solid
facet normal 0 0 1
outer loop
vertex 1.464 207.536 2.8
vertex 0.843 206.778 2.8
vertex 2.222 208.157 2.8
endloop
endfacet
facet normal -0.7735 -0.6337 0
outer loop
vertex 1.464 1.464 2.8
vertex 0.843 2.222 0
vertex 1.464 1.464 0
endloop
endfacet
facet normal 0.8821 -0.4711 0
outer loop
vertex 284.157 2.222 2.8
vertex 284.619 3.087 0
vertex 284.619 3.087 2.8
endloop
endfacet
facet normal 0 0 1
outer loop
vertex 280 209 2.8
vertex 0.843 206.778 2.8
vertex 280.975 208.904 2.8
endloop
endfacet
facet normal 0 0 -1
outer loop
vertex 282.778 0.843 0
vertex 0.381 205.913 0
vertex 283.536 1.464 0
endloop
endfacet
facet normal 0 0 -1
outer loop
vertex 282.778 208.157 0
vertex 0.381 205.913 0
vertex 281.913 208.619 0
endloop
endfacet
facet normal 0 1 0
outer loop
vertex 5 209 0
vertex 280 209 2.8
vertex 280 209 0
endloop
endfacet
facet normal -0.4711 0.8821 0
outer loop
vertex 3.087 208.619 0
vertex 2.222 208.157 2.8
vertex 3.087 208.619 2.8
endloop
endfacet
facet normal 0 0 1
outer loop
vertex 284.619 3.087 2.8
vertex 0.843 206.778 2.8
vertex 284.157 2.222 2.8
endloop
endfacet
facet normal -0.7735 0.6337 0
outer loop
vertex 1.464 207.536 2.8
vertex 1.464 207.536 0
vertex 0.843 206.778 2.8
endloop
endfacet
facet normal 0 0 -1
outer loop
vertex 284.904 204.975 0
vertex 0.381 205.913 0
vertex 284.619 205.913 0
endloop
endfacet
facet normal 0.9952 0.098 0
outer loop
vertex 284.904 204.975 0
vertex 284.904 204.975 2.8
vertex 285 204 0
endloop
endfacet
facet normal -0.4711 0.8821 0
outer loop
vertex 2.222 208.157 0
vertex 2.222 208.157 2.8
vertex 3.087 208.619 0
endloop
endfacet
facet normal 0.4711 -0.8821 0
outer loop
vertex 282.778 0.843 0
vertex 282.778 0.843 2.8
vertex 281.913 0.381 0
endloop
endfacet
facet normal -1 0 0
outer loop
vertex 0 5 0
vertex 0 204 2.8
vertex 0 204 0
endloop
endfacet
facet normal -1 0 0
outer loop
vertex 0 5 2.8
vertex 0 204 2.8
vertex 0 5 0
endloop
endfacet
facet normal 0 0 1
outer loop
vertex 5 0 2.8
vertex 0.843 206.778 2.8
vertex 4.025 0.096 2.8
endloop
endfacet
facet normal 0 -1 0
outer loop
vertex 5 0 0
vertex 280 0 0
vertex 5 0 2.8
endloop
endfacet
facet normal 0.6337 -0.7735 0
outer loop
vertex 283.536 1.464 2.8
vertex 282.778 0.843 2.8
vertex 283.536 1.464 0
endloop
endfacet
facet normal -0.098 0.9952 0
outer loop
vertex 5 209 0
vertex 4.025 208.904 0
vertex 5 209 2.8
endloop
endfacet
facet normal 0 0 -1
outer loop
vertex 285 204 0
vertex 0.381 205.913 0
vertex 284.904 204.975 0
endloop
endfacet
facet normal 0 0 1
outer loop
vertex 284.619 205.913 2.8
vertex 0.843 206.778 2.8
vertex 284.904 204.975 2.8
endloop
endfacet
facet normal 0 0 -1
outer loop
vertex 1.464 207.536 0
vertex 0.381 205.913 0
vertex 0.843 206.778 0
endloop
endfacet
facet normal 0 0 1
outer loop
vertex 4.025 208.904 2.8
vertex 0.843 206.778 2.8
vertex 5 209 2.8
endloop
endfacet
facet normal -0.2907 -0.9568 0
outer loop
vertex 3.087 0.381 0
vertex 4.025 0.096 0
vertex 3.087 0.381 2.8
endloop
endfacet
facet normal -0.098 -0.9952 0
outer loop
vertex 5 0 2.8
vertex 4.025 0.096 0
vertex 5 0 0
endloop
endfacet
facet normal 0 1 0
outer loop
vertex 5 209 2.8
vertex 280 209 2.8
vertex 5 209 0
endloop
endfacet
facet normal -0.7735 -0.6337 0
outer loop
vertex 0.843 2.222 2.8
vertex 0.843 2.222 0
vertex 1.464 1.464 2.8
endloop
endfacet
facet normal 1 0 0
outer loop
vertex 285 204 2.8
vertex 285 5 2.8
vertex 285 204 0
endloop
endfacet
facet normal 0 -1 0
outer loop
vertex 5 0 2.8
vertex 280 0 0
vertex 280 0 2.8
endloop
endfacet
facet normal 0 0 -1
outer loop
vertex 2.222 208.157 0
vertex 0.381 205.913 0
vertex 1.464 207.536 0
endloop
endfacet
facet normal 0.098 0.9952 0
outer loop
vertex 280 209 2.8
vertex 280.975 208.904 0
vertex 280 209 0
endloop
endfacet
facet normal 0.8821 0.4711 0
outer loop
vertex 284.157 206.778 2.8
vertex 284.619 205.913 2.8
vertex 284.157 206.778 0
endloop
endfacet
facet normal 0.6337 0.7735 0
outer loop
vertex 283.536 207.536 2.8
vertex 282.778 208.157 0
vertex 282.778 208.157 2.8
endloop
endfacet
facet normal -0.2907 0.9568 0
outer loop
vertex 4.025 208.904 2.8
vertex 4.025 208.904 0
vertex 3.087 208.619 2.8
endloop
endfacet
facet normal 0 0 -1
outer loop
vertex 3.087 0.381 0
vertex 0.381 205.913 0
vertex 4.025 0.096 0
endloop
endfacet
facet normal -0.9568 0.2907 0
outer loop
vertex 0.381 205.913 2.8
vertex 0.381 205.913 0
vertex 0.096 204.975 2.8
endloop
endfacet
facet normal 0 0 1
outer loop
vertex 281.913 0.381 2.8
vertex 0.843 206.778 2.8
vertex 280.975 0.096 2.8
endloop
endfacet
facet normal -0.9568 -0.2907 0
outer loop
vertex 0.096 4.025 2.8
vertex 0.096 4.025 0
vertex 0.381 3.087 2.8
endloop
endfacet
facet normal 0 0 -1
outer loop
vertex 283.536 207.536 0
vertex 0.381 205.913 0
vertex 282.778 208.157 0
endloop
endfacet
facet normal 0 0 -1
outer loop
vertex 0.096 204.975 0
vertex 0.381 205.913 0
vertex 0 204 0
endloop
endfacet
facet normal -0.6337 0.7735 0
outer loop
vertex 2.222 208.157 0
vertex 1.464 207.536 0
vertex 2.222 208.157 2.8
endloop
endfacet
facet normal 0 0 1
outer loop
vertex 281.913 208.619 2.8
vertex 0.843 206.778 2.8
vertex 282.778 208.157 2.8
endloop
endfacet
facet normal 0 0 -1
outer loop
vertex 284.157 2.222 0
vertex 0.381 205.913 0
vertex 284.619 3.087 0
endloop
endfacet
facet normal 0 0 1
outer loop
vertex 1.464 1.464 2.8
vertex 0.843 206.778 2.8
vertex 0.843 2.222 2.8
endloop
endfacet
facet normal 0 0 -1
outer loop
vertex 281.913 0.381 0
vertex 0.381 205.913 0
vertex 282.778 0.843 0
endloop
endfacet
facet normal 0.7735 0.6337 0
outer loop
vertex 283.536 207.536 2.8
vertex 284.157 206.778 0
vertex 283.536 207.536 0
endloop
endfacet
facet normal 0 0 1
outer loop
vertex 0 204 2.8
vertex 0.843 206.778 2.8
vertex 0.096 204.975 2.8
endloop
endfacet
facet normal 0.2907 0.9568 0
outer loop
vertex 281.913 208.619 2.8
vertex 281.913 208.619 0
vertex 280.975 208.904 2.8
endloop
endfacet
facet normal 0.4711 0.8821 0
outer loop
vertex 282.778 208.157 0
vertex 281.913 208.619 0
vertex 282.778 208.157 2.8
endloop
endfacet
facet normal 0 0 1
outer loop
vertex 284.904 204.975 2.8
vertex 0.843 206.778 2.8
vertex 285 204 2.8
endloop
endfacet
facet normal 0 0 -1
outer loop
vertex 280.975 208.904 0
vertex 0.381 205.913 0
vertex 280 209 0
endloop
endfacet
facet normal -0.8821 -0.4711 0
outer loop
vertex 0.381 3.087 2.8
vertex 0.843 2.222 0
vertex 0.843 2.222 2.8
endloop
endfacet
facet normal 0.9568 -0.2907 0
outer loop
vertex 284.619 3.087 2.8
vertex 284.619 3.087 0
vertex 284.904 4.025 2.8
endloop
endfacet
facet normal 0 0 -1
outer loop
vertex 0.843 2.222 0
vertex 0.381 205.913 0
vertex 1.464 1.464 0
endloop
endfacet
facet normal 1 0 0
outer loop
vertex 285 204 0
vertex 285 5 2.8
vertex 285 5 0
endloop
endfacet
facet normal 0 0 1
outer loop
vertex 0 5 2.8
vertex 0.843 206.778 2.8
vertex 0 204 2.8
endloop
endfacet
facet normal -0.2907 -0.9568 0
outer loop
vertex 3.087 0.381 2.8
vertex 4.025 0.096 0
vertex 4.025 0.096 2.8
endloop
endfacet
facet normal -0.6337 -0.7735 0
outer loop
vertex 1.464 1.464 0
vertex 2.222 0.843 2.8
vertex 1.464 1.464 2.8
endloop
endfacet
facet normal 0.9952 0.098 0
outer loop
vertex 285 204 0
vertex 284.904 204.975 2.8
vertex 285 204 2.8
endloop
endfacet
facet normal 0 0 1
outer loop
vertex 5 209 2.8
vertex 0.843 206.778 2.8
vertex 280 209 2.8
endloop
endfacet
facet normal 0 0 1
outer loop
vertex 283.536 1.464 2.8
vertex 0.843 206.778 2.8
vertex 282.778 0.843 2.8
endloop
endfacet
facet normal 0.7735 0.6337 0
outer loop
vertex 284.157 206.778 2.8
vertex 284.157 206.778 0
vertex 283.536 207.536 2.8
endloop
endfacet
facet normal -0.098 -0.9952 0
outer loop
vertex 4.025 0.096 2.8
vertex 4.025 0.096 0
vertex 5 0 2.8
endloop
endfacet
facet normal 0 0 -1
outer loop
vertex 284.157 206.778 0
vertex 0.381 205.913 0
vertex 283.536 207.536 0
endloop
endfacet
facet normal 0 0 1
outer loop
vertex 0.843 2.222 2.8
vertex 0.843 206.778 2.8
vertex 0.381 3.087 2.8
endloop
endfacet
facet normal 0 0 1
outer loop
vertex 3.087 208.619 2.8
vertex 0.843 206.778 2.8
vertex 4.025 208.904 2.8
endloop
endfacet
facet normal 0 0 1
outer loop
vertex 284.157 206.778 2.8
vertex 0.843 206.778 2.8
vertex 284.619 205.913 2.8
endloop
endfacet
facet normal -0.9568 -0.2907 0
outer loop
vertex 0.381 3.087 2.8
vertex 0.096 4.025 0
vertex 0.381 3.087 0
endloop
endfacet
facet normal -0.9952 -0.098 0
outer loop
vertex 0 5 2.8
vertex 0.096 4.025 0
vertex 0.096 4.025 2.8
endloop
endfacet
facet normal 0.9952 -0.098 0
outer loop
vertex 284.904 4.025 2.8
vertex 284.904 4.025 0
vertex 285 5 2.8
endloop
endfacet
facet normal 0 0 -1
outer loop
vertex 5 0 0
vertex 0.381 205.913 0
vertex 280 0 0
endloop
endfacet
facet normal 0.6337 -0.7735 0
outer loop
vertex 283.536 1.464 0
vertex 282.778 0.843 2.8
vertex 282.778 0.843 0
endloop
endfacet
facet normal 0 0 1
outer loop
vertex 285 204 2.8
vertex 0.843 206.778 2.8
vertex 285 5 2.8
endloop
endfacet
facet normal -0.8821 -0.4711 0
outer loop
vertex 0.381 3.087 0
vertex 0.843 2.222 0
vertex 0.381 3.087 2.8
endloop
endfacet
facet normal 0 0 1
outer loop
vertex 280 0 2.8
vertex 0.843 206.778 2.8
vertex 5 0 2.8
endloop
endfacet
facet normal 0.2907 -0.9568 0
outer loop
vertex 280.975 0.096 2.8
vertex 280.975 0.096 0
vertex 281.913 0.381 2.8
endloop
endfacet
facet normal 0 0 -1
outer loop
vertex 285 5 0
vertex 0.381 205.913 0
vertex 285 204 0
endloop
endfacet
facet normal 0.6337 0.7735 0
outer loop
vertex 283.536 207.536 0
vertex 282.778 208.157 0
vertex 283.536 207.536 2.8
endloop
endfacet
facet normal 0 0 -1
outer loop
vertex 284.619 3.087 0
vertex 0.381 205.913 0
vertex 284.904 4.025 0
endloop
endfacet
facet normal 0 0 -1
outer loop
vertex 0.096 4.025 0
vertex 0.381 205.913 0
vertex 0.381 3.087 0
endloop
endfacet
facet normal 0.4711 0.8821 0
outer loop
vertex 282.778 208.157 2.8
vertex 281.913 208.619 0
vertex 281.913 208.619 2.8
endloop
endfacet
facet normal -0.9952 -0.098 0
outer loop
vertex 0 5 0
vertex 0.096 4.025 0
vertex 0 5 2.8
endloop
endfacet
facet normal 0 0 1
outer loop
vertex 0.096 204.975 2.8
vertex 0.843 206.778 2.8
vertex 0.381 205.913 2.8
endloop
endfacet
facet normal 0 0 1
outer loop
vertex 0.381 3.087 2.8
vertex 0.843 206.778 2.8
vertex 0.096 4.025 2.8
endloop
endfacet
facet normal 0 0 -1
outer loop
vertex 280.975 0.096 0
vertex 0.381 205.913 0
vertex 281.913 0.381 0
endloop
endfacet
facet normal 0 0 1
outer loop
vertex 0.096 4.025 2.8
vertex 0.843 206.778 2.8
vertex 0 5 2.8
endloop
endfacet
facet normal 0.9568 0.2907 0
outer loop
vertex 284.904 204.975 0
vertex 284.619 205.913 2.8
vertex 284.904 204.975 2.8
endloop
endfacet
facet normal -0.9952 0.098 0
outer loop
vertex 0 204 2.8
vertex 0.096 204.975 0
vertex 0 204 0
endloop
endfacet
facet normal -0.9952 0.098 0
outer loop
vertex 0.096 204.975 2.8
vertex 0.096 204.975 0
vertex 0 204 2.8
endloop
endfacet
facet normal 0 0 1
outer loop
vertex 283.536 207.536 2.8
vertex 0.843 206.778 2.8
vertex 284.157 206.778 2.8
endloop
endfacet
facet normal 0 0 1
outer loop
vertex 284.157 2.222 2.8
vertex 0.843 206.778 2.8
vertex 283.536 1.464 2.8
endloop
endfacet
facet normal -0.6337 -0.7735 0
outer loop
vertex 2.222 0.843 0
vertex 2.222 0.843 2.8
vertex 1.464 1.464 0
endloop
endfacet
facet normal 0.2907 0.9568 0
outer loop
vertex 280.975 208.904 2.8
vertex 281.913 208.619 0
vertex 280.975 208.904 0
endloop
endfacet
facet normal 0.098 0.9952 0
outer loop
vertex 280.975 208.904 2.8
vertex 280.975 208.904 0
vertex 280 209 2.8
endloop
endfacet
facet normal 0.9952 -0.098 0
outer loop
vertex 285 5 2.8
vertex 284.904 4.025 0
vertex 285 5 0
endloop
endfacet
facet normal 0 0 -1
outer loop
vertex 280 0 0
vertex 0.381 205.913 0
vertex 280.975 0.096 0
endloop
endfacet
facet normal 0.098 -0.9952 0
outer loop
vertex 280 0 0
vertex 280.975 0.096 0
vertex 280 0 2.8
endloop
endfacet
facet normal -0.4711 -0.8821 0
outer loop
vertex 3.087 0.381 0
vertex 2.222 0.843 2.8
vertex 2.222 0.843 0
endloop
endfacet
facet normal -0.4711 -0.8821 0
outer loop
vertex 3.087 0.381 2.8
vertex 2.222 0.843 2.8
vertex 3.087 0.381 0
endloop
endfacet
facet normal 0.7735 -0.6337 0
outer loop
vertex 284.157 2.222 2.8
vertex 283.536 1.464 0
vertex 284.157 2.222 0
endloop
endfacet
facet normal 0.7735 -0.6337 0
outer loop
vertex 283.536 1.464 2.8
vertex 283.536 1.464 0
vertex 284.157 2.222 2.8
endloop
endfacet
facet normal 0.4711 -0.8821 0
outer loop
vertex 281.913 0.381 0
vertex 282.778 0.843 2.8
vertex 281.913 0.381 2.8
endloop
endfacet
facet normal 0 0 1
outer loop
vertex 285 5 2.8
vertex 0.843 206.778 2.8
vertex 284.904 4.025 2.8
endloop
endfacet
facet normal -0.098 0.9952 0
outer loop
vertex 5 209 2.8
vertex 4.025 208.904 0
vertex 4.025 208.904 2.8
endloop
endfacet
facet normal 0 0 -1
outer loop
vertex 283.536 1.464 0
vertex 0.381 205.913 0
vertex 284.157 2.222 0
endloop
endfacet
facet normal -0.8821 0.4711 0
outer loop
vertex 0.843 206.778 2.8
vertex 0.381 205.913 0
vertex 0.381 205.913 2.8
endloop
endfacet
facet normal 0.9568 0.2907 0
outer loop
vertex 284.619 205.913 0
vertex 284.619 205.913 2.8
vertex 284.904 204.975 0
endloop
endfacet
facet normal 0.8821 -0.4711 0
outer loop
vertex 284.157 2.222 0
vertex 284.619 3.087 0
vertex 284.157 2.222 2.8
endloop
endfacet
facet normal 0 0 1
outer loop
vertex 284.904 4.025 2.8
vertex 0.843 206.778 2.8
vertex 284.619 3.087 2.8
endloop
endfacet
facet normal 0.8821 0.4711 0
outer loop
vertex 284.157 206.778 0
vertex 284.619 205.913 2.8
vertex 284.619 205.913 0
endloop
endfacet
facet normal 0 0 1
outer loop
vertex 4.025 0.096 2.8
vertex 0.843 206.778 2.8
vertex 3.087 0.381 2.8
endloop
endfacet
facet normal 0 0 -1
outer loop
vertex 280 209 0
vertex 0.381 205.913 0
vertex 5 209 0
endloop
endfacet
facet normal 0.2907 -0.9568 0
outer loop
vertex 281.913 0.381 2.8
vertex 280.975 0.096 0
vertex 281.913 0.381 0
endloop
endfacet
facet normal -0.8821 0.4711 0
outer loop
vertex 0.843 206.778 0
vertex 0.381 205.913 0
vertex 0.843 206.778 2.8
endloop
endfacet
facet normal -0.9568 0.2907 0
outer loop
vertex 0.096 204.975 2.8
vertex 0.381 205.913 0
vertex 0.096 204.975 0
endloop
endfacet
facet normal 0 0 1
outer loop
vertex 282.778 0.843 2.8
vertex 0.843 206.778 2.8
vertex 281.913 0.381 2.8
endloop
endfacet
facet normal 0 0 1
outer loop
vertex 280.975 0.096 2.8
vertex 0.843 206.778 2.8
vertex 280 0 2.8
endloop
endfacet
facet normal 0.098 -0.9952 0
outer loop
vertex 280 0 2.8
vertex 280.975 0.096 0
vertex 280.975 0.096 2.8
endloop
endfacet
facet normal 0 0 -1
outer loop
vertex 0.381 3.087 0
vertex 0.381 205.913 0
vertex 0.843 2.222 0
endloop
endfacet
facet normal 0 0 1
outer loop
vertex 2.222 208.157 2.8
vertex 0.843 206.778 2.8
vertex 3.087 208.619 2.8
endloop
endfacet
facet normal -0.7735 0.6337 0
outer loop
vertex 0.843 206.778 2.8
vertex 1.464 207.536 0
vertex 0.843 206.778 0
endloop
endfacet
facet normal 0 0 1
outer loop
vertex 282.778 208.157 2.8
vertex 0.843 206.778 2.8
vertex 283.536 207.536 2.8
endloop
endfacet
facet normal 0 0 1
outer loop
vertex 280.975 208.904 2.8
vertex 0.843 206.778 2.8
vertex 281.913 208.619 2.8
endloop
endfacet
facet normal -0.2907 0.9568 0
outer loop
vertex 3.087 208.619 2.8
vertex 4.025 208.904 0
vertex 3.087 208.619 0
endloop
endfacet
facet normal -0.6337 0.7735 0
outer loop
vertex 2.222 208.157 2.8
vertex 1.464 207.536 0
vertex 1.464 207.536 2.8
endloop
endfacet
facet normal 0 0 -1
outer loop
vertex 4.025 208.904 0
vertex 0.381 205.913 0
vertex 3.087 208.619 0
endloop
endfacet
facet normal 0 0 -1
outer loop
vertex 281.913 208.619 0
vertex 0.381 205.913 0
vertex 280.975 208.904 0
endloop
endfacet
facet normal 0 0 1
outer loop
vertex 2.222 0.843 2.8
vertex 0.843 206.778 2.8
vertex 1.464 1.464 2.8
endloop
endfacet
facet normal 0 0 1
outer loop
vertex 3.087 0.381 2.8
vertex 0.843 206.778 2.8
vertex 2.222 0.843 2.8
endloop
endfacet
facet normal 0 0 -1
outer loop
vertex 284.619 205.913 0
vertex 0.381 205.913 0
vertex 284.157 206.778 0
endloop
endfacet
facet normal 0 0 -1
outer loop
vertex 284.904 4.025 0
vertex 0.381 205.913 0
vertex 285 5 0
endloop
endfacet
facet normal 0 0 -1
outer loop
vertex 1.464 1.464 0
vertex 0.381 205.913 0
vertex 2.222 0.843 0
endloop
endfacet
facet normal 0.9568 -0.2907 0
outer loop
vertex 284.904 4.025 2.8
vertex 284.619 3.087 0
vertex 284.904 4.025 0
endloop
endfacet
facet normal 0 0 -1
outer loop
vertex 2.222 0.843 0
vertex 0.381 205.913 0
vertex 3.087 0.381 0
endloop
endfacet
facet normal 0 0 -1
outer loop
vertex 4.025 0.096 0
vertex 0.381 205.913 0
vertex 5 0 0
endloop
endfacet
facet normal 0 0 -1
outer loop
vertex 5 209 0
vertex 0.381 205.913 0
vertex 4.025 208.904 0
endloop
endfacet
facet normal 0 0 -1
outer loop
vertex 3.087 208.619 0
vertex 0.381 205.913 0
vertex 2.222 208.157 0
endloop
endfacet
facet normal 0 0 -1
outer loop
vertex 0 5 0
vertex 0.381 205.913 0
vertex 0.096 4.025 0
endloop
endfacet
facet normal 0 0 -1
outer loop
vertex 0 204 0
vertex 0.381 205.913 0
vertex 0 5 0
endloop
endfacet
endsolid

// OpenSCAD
// 机箱前面板 - 简化版本 (无X图案)
// 尺寸: 285mm x 209mm x 2.8mm
// 四角倒角设计

// 参数
width = 285;     // 宽度 (mm)
height = 209;    // 高度 (mm)
thickness = 2.8; // 厚度 (mm)
corner_radius = 5;  // 倒角半径 (mm)

// 圆角矩形模块
module rounded_rect(w, h, r, t) {
    hull() {
        translate([r, r, 0]) cylinder(h = t, r = r, $fn = 32);
        translate([w - r, r, 0]) cylinder(h = t, r = r, $fn = 32);
        translate([w - r, h - r, 0]) cylinder(h = t, r = r, $fn = 32);
        translate([r, h - r, 0]) cylinder(h = t, r = r, $fn = 32);
    }
}

// 创建前面板
color("LightGray") {
    rounded_rect(width, height, corner_radius, thickness);
}
